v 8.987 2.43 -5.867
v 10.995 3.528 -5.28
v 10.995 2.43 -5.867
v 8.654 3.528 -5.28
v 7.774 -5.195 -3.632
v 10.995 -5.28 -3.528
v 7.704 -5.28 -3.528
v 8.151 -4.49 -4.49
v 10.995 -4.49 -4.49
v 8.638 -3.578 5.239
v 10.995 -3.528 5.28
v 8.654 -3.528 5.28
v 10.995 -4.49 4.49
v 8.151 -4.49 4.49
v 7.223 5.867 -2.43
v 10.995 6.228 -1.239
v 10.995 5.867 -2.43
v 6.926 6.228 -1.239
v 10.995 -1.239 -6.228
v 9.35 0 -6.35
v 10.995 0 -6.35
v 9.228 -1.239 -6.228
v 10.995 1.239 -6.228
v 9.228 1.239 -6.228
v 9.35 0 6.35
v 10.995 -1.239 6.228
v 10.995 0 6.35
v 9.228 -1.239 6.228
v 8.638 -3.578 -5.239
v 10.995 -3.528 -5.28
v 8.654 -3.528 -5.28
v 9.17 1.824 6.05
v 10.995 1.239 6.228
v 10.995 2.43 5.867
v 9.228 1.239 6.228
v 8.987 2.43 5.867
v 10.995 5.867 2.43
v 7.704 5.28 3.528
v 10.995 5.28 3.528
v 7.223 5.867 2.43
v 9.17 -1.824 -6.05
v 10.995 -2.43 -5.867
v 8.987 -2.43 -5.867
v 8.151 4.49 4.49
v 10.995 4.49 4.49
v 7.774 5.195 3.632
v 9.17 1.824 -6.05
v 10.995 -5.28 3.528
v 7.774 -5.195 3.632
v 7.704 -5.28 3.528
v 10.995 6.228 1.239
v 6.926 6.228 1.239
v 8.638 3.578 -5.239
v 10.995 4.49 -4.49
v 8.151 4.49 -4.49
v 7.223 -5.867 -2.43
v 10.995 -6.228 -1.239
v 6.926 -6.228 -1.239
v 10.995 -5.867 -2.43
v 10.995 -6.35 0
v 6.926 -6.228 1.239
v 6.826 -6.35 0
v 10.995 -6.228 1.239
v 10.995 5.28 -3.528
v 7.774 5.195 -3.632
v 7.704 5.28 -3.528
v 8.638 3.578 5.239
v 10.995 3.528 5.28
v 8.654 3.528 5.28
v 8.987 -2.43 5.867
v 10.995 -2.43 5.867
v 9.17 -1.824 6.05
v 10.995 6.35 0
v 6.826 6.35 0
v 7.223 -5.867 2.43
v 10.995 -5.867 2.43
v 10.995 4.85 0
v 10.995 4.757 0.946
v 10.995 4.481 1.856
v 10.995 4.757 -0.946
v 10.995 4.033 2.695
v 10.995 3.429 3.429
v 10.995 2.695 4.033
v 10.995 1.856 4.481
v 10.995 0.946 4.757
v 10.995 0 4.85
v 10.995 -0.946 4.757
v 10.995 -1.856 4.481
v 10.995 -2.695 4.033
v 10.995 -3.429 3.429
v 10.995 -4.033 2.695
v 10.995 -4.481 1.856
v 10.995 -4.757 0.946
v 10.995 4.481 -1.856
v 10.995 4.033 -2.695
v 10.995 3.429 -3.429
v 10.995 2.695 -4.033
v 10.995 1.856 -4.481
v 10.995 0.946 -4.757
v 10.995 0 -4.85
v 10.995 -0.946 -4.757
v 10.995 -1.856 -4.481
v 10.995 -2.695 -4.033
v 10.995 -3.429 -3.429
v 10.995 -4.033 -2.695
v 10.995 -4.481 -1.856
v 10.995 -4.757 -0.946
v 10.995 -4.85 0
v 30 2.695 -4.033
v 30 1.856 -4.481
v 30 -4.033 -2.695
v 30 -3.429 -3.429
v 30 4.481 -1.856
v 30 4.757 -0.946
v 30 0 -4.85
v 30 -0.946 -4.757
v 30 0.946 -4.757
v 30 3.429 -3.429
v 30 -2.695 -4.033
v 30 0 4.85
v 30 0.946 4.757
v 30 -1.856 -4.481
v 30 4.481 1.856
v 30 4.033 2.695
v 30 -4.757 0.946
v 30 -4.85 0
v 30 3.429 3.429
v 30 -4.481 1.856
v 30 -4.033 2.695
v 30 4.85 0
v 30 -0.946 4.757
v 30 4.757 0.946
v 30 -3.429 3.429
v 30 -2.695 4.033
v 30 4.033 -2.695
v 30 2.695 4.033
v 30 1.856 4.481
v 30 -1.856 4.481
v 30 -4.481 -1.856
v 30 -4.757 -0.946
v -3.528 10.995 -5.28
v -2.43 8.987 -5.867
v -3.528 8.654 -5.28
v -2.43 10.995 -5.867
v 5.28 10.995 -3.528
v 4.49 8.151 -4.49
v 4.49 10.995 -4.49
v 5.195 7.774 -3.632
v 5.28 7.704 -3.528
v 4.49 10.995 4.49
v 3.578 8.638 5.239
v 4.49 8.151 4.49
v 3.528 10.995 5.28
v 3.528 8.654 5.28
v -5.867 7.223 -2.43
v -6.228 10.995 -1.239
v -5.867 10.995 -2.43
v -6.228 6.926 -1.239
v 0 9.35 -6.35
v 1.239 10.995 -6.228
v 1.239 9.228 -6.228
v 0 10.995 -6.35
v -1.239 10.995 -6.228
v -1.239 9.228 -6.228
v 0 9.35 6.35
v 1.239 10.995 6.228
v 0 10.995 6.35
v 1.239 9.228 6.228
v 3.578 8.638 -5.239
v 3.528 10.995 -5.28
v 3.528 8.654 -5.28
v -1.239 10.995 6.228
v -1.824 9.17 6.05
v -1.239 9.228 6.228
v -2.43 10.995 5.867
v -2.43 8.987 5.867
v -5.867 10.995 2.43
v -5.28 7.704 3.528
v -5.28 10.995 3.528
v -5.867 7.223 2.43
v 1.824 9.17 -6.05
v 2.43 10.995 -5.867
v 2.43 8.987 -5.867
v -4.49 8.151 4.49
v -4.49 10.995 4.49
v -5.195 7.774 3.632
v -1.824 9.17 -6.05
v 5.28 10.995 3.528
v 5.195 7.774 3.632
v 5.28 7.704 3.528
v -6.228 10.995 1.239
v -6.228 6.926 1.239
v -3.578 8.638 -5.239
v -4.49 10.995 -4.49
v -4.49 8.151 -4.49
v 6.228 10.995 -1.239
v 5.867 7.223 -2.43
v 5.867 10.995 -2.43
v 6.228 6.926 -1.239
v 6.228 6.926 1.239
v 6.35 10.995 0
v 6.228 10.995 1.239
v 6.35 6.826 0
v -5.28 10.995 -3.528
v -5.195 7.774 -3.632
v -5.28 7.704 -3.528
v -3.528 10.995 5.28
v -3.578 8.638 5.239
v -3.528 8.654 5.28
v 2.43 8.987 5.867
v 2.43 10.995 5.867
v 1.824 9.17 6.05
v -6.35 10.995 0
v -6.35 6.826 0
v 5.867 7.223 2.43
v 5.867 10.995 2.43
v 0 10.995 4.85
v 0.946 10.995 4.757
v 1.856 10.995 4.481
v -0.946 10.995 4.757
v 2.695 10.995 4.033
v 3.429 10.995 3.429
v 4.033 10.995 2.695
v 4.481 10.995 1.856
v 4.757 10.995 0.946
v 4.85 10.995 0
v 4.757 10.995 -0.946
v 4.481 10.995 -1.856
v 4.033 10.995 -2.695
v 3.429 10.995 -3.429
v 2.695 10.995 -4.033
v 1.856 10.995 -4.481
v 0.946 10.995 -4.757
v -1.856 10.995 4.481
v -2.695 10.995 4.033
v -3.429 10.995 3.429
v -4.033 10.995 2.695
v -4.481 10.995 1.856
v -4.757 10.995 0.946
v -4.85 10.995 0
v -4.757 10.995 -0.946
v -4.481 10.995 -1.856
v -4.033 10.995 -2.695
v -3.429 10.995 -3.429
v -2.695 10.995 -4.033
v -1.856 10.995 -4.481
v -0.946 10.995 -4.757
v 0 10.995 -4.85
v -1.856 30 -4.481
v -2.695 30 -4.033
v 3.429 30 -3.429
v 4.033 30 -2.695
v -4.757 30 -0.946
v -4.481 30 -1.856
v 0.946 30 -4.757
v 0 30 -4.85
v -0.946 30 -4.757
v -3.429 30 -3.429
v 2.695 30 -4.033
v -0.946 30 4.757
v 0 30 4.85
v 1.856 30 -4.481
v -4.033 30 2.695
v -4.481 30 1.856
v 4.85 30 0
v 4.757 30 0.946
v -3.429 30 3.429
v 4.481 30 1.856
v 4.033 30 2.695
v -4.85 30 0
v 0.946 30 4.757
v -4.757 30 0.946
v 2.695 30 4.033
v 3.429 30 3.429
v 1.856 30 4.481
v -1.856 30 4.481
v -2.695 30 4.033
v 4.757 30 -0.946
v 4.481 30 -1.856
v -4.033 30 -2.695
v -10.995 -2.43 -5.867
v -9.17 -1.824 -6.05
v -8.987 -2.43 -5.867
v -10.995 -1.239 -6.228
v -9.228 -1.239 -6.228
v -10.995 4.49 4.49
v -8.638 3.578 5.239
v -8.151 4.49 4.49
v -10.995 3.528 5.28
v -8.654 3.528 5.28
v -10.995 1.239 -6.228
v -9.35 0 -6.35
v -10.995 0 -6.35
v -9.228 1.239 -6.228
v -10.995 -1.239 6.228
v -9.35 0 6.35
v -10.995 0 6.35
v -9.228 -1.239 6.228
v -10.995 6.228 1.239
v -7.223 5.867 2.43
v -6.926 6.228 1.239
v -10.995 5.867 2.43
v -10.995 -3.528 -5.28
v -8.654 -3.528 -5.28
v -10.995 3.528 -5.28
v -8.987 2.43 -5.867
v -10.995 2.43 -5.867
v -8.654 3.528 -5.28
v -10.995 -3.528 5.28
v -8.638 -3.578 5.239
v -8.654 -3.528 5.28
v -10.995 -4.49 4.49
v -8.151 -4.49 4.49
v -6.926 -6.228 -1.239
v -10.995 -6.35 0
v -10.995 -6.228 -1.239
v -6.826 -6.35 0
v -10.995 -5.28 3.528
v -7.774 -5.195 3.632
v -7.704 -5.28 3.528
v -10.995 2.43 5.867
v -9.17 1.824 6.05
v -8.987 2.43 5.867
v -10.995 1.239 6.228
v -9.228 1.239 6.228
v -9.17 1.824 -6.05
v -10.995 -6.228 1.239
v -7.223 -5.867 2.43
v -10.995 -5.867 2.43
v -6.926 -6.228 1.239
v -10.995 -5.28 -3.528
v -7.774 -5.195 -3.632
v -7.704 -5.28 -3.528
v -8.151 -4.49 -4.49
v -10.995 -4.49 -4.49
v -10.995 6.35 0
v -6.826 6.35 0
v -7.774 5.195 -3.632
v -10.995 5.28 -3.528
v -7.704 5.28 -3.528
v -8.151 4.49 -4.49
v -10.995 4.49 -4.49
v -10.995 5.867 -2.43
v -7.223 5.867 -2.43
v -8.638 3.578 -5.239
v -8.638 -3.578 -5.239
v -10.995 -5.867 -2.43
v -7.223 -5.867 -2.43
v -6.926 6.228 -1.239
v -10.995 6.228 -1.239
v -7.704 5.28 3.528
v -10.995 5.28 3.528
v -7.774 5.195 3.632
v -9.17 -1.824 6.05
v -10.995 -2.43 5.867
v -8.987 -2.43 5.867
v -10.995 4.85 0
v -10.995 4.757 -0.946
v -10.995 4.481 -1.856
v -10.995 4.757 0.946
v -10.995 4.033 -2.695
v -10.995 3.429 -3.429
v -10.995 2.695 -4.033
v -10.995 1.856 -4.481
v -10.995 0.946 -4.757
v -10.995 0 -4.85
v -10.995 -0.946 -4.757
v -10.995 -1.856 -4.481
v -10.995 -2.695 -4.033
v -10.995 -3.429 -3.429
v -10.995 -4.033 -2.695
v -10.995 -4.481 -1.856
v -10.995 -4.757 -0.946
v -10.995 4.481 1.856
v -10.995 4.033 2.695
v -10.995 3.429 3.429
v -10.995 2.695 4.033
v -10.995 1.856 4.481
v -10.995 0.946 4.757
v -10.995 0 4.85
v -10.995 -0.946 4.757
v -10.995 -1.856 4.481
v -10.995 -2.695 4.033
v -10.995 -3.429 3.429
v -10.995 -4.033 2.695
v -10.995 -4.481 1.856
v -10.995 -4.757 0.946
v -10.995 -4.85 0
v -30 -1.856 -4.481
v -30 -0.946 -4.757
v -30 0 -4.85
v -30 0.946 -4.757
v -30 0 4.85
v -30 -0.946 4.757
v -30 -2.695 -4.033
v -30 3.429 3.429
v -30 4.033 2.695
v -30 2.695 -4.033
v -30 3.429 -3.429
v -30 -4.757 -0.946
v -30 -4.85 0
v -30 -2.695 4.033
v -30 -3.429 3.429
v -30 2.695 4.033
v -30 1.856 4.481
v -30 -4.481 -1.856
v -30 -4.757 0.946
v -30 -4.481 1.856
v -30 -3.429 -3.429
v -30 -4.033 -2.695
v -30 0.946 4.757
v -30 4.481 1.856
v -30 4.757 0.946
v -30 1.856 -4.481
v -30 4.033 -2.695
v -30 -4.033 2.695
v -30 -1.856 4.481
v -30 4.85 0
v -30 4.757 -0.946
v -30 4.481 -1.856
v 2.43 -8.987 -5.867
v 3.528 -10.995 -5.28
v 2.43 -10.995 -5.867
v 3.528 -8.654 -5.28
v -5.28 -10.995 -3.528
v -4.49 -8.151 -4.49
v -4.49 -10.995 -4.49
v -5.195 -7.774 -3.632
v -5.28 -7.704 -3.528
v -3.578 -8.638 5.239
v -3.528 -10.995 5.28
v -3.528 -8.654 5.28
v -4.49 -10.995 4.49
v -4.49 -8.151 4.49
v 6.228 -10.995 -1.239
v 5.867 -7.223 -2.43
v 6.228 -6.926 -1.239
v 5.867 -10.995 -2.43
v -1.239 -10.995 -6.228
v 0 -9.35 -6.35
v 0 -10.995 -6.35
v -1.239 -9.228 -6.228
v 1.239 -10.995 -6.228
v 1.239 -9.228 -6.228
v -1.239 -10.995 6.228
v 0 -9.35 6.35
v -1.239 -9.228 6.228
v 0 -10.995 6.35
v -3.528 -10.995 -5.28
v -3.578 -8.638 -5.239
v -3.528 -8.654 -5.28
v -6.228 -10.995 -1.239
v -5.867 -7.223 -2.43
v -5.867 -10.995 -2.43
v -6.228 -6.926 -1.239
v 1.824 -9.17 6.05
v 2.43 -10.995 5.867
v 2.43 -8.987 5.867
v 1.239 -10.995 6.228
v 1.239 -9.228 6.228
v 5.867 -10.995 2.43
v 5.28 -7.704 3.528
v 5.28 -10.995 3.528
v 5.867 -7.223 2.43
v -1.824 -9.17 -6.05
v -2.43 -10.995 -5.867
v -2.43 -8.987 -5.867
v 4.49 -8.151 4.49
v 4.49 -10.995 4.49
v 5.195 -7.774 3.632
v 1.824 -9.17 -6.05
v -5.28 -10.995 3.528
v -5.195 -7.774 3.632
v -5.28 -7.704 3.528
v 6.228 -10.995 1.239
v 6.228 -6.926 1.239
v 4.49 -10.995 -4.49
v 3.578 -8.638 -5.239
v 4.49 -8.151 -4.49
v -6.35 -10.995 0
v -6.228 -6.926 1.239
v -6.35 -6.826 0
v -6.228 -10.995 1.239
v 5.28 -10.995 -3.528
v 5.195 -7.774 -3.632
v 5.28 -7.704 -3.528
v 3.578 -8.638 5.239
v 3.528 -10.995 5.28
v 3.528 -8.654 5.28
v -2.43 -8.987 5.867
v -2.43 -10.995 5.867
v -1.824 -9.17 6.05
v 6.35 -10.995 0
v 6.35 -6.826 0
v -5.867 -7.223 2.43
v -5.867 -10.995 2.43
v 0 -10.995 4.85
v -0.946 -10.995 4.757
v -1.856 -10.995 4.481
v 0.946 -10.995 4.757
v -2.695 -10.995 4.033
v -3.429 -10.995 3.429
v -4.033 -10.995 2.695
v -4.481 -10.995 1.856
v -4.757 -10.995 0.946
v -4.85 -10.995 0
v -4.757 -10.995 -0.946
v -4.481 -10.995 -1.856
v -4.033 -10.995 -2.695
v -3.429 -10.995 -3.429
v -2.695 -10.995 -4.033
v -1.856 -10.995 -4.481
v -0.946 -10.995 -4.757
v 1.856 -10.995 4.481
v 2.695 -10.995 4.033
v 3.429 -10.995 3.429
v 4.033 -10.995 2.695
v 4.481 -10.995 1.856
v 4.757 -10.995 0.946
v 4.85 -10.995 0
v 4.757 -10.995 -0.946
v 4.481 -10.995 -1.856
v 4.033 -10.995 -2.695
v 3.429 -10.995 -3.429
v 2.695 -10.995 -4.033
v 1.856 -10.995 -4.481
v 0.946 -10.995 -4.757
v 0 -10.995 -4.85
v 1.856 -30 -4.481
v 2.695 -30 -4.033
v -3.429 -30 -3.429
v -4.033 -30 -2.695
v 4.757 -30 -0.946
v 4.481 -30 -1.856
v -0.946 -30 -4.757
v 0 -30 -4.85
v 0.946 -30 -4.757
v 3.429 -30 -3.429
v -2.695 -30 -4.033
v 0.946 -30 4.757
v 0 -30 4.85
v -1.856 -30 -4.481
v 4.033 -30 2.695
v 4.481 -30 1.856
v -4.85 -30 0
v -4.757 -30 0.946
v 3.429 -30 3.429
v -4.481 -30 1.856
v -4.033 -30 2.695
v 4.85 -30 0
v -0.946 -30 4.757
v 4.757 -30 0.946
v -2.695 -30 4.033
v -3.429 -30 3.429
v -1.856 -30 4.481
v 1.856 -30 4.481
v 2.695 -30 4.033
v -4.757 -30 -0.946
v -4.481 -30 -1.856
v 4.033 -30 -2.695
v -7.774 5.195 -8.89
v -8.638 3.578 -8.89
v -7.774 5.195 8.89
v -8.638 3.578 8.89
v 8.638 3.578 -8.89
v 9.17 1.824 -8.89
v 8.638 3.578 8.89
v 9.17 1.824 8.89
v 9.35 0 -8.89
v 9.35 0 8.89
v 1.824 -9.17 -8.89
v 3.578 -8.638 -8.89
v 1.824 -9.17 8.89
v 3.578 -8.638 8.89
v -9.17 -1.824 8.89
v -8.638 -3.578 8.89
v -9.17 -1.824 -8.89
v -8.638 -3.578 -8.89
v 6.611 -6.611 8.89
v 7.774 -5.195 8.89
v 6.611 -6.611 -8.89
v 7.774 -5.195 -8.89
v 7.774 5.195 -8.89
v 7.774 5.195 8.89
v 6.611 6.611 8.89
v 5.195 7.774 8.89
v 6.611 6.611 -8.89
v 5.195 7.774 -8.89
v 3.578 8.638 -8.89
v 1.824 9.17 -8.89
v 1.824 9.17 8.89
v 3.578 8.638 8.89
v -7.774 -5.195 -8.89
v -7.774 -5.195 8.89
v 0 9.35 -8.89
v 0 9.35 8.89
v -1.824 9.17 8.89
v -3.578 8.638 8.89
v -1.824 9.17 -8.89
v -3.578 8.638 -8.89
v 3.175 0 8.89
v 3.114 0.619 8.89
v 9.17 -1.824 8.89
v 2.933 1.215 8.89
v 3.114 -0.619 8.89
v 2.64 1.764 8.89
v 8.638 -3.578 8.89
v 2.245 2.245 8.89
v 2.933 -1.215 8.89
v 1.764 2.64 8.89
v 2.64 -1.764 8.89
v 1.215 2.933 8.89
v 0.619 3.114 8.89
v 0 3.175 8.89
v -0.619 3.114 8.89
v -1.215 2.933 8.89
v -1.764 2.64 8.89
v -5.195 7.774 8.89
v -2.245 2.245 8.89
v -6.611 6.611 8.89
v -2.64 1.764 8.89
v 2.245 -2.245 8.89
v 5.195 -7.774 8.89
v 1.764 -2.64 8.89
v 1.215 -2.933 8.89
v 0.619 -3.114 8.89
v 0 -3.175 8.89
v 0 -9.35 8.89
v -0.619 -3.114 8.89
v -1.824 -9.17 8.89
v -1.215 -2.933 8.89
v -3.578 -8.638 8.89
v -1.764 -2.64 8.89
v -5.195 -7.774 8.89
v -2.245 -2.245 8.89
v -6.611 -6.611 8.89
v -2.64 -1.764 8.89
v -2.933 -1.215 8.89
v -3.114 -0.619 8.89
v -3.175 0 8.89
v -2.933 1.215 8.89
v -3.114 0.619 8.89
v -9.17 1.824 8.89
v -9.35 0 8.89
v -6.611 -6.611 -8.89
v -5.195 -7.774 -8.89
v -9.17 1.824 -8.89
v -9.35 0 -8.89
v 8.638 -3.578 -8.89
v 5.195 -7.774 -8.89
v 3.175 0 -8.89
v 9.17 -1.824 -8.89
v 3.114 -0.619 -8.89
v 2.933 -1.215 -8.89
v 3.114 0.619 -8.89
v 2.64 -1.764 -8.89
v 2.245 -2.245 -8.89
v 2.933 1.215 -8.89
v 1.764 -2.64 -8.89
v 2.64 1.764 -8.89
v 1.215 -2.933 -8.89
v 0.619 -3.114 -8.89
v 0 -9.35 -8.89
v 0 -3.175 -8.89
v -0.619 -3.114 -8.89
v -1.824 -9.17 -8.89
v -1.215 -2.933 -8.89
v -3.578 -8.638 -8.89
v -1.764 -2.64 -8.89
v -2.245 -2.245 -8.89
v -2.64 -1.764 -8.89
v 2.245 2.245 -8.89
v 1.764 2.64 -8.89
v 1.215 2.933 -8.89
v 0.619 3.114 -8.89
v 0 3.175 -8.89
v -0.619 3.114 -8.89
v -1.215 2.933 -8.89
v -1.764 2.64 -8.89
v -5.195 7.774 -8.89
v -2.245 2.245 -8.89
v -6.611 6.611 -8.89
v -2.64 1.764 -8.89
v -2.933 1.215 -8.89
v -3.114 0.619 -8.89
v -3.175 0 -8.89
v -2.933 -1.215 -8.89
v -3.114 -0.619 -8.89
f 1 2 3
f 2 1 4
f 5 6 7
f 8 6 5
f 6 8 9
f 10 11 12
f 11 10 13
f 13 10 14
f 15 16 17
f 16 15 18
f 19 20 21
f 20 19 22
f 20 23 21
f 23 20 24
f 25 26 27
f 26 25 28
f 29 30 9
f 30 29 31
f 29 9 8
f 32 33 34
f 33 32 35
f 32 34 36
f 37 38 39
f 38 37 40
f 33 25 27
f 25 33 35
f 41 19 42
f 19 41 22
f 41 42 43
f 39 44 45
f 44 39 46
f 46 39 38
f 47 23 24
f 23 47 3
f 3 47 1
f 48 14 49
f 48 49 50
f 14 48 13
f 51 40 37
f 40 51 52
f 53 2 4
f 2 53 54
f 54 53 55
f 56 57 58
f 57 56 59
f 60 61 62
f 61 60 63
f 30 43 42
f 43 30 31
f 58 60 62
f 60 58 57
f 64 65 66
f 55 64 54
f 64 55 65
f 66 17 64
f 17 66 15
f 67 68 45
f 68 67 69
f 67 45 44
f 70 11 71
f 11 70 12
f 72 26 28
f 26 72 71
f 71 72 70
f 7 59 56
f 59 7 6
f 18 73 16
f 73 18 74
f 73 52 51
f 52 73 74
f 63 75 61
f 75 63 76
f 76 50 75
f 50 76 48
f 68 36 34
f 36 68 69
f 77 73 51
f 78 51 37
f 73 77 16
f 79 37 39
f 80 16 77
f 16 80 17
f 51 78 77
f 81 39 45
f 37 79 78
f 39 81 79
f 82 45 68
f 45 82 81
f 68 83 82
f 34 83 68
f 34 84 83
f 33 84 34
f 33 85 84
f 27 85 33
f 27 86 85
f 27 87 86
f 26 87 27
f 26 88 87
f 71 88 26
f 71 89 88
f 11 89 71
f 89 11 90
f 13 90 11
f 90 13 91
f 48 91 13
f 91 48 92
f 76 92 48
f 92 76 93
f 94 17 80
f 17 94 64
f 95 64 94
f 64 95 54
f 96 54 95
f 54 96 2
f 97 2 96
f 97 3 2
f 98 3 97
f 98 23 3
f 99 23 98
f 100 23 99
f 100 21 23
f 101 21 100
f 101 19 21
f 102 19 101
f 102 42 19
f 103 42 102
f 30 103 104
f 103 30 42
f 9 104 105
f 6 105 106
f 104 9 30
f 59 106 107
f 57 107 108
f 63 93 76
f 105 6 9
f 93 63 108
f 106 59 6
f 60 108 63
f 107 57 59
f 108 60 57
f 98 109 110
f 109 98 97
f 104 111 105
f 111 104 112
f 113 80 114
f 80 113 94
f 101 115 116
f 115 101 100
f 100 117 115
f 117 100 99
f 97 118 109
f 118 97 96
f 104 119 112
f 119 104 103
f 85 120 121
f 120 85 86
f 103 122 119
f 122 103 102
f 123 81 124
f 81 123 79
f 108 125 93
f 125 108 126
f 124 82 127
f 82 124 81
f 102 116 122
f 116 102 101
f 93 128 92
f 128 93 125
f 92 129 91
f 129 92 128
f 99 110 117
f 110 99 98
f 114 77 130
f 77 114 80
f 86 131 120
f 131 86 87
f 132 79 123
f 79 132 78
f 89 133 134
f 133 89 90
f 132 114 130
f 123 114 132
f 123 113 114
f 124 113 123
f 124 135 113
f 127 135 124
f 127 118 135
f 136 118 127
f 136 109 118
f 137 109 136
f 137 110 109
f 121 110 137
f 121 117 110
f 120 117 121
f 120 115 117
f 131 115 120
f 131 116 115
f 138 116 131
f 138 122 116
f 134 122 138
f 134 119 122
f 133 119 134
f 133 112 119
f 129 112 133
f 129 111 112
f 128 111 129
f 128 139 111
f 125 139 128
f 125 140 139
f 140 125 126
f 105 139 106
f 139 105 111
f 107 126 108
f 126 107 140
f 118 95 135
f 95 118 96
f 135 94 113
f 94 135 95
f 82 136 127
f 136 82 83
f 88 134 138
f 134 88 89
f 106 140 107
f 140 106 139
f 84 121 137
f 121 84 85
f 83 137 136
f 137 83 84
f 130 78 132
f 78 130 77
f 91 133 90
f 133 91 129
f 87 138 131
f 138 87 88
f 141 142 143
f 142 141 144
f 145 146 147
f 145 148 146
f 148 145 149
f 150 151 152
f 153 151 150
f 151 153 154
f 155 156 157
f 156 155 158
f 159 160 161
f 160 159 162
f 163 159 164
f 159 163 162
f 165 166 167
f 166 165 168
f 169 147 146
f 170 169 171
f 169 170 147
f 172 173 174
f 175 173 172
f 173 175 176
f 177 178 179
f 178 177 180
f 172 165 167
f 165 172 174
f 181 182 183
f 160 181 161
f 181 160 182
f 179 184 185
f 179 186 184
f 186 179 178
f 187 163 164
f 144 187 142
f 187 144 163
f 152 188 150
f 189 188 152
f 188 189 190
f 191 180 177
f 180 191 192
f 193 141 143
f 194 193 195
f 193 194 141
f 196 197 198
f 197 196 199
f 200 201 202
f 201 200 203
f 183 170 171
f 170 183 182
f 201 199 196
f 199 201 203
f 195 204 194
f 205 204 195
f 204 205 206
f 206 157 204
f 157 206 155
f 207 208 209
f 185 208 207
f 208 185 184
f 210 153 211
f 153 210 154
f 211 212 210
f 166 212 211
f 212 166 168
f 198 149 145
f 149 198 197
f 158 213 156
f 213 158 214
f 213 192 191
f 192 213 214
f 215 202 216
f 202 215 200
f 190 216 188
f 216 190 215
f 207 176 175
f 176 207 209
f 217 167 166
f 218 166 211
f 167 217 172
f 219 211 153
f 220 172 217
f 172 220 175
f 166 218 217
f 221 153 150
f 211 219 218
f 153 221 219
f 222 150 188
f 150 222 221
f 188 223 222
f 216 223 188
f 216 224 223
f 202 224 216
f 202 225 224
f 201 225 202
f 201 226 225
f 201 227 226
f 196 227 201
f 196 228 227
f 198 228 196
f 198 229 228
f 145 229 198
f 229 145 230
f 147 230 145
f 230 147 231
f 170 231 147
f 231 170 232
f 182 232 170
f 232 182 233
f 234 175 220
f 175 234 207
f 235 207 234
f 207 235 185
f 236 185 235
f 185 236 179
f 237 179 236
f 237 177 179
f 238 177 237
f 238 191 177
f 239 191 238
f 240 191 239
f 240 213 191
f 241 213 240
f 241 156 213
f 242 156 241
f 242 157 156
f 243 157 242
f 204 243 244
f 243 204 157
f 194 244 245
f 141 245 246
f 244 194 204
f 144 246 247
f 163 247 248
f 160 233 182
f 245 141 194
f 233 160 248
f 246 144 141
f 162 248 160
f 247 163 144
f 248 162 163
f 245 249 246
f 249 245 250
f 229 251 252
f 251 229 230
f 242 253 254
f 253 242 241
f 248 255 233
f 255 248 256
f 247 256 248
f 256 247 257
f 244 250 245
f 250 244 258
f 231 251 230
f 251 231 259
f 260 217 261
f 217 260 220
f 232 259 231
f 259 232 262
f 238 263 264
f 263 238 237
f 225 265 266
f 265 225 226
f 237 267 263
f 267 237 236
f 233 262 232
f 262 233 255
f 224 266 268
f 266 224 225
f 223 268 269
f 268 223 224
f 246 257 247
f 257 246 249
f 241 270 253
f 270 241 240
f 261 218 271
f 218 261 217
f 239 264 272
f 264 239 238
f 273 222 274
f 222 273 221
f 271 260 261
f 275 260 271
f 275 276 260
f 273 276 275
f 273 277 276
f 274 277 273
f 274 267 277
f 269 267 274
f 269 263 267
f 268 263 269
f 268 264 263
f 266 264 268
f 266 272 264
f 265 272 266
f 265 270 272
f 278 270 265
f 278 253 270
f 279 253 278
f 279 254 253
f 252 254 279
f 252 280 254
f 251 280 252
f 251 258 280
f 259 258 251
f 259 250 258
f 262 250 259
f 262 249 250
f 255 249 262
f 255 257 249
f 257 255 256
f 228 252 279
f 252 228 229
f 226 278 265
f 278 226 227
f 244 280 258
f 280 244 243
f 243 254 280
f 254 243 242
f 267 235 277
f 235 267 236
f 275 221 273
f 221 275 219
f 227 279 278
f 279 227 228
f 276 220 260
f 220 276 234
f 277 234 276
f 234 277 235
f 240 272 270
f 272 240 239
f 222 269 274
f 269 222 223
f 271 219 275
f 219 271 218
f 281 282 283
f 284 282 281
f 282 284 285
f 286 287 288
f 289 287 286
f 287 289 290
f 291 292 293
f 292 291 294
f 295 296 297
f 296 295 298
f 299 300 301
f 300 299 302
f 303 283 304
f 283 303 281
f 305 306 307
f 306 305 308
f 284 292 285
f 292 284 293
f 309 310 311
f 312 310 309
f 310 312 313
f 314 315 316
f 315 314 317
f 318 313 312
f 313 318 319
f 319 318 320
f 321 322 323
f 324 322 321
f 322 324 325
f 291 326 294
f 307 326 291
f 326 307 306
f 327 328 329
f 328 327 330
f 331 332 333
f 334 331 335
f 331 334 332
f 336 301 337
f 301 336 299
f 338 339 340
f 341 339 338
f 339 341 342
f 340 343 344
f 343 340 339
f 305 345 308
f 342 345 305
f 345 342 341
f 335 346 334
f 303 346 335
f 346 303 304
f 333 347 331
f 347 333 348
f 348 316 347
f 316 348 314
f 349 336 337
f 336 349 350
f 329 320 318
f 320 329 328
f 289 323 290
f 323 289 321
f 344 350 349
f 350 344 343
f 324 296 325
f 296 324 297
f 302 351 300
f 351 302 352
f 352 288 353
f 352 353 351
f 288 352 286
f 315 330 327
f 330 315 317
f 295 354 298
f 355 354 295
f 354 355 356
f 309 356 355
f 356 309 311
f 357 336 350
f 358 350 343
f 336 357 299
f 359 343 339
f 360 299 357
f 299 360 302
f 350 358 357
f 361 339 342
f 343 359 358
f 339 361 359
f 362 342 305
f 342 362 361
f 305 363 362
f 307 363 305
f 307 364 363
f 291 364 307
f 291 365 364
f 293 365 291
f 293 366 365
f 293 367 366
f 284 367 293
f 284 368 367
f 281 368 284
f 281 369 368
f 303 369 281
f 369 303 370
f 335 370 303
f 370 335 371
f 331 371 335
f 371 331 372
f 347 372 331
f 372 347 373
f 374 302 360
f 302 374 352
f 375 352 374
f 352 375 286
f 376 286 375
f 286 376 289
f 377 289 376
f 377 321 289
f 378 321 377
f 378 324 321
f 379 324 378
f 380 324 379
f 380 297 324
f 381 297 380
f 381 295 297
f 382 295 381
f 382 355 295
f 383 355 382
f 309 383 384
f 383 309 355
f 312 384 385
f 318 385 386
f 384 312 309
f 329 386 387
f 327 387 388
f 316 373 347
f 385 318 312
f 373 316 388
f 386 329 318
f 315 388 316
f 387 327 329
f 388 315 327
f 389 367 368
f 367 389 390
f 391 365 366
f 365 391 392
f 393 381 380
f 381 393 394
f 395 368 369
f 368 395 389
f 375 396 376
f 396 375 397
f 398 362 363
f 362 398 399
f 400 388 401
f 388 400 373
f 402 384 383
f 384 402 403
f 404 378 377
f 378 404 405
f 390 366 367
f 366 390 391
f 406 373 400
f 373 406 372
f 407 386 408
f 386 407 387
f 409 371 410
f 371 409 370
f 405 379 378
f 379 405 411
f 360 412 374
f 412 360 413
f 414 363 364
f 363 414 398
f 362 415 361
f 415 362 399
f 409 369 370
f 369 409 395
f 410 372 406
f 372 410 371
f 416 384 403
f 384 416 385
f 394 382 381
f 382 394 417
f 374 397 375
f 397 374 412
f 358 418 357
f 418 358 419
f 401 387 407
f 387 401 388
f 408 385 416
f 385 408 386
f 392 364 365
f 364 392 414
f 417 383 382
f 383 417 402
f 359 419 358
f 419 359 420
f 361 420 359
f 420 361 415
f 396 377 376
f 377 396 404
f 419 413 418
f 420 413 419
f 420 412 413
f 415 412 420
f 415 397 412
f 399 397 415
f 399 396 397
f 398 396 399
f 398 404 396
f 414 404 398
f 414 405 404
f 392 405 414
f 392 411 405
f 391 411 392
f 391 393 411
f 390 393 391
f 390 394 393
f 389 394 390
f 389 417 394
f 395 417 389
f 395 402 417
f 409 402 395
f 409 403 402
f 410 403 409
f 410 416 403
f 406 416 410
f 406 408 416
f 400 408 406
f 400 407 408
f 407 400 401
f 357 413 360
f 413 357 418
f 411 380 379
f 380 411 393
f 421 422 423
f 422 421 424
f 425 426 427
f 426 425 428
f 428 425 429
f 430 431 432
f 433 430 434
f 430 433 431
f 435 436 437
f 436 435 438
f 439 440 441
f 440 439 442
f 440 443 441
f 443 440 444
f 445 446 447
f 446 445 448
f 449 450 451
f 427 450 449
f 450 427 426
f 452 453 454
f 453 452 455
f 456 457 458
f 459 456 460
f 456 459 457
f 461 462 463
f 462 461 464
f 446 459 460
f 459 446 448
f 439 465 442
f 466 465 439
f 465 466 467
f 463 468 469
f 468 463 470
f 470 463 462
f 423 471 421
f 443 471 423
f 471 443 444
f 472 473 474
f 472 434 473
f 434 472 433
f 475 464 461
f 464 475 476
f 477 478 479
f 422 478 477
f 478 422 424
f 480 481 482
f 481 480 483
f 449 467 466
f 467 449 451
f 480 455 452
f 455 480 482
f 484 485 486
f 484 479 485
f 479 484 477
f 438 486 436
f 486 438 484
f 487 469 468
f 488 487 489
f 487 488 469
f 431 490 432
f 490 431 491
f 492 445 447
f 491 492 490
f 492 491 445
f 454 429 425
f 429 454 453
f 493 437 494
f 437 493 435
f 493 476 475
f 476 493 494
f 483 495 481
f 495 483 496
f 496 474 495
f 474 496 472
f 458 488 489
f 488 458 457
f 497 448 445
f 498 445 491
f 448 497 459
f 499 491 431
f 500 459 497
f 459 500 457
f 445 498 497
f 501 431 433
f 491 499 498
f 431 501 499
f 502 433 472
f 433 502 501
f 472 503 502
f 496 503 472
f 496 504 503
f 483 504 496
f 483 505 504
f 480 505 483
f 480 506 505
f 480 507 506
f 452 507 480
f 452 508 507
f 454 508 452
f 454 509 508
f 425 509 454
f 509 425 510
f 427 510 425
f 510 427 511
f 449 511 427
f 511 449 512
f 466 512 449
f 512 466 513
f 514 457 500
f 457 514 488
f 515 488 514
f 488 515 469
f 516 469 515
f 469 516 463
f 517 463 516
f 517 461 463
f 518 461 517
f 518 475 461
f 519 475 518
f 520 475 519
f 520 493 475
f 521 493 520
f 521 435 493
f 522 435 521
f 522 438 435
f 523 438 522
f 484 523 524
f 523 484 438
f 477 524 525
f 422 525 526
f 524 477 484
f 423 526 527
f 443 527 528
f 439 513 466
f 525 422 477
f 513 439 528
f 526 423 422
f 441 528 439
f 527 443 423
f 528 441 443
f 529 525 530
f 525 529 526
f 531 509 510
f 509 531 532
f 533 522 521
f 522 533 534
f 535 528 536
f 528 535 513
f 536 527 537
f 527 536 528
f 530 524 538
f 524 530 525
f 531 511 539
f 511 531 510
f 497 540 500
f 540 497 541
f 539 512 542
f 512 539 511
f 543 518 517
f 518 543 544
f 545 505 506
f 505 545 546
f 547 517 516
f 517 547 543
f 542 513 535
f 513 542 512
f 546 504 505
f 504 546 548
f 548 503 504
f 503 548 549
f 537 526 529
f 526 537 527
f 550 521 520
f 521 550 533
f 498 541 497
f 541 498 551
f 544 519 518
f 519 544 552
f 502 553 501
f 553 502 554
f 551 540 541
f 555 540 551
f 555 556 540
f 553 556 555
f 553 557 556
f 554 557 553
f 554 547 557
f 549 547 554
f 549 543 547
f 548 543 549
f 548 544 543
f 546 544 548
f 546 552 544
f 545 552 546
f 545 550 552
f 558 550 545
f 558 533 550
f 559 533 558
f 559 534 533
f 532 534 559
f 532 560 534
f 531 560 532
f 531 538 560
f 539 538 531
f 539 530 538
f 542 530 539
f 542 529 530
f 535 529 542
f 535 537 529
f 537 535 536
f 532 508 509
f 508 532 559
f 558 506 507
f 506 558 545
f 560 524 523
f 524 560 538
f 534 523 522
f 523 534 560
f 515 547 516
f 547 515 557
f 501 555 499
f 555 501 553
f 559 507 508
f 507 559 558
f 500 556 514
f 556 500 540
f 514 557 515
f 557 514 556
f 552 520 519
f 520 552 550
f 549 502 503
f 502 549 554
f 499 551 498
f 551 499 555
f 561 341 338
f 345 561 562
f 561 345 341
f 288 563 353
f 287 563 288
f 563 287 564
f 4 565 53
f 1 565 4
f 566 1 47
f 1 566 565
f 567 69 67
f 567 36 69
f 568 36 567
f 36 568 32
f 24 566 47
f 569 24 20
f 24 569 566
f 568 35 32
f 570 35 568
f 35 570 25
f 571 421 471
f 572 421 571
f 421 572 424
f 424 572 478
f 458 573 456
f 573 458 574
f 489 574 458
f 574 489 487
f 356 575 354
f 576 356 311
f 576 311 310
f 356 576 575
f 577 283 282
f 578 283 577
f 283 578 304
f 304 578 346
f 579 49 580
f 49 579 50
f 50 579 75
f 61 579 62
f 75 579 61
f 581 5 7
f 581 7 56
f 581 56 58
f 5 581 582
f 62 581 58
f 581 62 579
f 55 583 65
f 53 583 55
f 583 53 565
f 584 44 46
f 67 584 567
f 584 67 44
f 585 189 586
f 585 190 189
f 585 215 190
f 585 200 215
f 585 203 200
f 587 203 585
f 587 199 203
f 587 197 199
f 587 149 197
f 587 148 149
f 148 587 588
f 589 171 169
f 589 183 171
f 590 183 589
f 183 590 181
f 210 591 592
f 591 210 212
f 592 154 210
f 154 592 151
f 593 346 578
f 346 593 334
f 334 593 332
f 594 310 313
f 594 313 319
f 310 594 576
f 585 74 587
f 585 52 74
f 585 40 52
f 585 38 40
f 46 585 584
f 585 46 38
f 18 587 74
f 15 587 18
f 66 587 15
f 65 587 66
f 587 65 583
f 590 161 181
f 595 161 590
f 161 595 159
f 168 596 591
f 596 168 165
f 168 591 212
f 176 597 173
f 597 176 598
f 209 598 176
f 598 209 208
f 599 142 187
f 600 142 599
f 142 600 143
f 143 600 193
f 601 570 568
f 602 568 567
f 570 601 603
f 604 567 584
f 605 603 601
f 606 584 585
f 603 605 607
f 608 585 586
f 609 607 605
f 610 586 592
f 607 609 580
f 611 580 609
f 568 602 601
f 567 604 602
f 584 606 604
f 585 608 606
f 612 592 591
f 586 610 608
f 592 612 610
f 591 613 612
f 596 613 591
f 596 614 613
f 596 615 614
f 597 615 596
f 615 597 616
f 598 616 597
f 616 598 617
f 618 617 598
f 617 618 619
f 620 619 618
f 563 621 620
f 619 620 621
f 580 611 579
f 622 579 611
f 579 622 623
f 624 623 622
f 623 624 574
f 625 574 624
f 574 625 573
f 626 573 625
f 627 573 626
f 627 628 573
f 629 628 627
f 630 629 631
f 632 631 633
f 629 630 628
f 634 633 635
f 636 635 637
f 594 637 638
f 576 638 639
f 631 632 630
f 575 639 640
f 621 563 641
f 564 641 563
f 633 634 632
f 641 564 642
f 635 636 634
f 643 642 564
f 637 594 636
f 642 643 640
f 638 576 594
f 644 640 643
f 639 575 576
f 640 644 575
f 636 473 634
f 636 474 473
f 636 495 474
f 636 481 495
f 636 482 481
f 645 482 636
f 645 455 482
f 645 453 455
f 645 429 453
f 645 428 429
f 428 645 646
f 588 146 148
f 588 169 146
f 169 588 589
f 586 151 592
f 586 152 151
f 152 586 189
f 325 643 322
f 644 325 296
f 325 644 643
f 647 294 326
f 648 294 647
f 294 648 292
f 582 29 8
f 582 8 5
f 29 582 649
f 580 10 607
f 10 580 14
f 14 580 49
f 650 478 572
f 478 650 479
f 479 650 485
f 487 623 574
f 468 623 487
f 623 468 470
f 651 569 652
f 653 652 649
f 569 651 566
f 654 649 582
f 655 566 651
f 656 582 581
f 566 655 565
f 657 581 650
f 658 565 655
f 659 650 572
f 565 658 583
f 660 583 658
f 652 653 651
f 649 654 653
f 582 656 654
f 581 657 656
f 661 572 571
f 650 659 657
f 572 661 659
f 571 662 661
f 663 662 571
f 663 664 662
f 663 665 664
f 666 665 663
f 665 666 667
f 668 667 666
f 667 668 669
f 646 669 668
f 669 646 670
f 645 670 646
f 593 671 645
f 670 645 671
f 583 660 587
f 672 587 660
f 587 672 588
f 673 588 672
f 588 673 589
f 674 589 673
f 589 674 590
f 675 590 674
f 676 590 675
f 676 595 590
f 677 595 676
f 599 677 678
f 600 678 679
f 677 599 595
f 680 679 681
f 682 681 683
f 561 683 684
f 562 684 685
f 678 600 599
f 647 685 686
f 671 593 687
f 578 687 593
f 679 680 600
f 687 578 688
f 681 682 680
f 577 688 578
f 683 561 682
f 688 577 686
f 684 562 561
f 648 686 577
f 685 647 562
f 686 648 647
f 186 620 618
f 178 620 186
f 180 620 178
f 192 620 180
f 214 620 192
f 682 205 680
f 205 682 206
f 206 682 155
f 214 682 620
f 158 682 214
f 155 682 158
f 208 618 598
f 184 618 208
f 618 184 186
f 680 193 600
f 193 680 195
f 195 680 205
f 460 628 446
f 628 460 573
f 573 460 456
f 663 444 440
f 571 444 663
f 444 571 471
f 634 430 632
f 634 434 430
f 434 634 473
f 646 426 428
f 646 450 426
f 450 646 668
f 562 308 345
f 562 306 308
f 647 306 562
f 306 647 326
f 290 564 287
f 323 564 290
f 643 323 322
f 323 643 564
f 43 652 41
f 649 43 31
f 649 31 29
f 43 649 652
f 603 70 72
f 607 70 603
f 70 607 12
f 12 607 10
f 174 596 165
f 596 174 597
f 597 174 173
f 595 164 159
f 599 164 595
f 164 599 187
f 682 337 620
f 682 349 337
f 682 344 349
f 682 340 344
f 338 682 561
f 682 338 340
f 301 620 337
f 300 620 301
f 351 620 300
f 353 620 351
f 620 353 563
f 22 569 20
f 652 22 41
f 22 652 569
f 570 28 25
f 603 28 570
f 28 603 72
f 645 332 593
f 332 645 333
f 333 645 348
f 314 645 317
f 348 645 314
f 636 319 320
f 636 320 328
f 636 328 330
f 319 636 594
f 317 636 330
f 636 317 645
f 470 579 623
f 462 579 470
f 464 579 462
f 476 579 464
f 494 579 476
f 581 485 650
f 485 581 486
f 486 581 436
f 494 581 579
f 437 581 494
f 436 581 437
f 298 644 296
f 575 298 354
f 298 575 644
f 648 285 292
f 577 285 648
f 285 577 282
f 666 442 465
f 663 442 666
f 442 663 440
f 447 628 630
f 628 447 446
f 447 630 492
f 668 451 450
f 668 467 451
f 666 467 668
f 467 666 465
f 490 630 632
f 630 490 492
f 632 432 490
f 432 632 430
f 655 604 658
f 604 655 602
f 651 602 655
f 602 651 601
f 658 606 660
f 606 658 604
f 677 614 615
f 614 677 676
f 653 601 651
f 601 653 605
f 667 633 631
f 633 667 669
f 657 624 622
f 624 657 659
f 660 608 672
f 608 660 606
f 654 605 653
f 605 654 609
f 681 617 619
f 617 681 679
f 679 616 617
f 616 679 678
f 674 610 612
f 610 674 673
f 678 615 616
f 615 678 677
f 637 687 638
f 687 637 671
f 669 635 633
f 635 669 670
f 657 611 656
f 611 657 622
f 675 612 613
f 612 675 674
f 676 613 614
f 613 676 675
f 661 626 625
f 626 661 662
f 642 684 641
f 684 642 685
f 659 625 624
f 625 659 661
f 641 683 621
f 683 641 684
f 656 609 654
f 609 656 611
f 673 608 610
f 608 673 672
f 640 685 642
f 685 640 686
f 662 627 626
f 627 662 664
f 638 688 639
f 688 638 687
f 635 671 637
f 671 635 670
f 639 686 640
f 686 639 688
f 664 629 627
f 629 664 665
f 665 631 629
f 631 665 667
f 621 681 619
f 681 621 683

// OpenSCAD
$fn = 32;

// ----------------------------------------------------------------------
// Cardan cross: 60 mm span, 12.7 mm trunnions
// ----------------------------------------------------------------------

// --- parameters (mm) ---
journal_d = 12.7;         // trunnion diameter
arm_len = 30;             // trunnion length from the centre
step_r = 4.32;            // step position from the centre
step_d = 9.7;             // journal diameter after the step
hub_d = 18.7;             // hub diameter
hub_h = 17.78;            // hub height
bore_d = 6.35;            // hub bore

difference() {
  union() {
    /* hub along the joint axis */
    cylinder(h = hub_h, d = hub_d, center = true);
    for (a = [0 : 90 : 270]) rotate([0, 0, a]) {
      /* trunnion, sunk into the hub */
      translate([hub_d / 4, 0, 0]) rotate([0, 90, 0]) cylinder(h = step_r + 2, d = journal_d);
      /* stepped journal out to the tip */
      translate([step_r - 0.5, 0, 0]) rotate([0, 90, 0]) cylinder(h = arm_len + 0.5 - step_r, d = step_d);
    }
  }
  /* lubrication bore through the hub, 2.5 mm clear on both sides */
  translate([0, 0, -hub_h / 2 - 2.5]) cylinder(h = hub_h + 5, d = bore_d);
}
